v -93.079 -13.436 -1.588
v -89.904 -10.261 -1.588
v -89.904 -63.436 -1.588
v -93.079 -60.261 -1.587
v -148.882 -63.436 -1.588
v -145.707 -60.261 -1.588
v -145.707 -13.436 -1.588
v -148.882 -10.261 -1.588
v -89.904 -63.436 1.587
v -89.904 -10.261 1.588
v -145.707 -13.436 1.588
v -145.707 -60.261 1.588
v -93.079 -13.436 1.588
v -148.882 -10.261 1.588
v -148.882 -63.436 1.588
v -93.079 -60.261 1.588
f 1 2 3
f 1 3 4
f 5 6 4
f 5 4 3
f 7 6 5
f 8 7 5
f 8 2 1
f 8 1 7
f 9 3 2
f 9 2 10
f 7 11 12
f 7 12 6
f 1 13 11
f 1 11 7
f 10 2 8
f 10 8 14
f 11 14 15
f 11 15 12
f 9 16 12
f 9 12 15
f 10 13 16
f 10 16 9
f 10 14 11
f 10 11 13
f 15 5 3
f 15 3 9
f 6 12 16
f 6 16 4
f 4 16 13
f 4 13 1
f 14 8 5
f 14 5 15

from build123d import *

# Parameters (mm, degrees)
F2_W = 3.175
F2_H = 3.175


with BuildPart() as f3:
    # F3: sweep along a path in F0
    with BuildLine(Plane.XY) as f3_path:
        Line((-147.2948789597, -61.8483945727), (-147.2948789597, -11.8481973186))
        Line((-147.2948789597, -11.8481973186), (-91.4910789597, -11.8481973186))
        Line((-91.4910789597, -11.8481973186), (-91.4910789597, -61.8483945727))
        Line((-91.4910789597, -61.8483945727), (-147.2948789597, -61.8483945727))
    # F2 (on line) → F3 (sweep)
    with BuildSketch(Plane(origin=(0, -61.8483945727, 0), x_dir=(-1, 0, 0), z_dir=(0, 1, 0))):
        with Locations((147.2948789597, 0)):
            Rectangle(F2_W, F2_H)
    sweep(path=f3_path.line, transition=Transition.RIGHT)


solid = f3.part
